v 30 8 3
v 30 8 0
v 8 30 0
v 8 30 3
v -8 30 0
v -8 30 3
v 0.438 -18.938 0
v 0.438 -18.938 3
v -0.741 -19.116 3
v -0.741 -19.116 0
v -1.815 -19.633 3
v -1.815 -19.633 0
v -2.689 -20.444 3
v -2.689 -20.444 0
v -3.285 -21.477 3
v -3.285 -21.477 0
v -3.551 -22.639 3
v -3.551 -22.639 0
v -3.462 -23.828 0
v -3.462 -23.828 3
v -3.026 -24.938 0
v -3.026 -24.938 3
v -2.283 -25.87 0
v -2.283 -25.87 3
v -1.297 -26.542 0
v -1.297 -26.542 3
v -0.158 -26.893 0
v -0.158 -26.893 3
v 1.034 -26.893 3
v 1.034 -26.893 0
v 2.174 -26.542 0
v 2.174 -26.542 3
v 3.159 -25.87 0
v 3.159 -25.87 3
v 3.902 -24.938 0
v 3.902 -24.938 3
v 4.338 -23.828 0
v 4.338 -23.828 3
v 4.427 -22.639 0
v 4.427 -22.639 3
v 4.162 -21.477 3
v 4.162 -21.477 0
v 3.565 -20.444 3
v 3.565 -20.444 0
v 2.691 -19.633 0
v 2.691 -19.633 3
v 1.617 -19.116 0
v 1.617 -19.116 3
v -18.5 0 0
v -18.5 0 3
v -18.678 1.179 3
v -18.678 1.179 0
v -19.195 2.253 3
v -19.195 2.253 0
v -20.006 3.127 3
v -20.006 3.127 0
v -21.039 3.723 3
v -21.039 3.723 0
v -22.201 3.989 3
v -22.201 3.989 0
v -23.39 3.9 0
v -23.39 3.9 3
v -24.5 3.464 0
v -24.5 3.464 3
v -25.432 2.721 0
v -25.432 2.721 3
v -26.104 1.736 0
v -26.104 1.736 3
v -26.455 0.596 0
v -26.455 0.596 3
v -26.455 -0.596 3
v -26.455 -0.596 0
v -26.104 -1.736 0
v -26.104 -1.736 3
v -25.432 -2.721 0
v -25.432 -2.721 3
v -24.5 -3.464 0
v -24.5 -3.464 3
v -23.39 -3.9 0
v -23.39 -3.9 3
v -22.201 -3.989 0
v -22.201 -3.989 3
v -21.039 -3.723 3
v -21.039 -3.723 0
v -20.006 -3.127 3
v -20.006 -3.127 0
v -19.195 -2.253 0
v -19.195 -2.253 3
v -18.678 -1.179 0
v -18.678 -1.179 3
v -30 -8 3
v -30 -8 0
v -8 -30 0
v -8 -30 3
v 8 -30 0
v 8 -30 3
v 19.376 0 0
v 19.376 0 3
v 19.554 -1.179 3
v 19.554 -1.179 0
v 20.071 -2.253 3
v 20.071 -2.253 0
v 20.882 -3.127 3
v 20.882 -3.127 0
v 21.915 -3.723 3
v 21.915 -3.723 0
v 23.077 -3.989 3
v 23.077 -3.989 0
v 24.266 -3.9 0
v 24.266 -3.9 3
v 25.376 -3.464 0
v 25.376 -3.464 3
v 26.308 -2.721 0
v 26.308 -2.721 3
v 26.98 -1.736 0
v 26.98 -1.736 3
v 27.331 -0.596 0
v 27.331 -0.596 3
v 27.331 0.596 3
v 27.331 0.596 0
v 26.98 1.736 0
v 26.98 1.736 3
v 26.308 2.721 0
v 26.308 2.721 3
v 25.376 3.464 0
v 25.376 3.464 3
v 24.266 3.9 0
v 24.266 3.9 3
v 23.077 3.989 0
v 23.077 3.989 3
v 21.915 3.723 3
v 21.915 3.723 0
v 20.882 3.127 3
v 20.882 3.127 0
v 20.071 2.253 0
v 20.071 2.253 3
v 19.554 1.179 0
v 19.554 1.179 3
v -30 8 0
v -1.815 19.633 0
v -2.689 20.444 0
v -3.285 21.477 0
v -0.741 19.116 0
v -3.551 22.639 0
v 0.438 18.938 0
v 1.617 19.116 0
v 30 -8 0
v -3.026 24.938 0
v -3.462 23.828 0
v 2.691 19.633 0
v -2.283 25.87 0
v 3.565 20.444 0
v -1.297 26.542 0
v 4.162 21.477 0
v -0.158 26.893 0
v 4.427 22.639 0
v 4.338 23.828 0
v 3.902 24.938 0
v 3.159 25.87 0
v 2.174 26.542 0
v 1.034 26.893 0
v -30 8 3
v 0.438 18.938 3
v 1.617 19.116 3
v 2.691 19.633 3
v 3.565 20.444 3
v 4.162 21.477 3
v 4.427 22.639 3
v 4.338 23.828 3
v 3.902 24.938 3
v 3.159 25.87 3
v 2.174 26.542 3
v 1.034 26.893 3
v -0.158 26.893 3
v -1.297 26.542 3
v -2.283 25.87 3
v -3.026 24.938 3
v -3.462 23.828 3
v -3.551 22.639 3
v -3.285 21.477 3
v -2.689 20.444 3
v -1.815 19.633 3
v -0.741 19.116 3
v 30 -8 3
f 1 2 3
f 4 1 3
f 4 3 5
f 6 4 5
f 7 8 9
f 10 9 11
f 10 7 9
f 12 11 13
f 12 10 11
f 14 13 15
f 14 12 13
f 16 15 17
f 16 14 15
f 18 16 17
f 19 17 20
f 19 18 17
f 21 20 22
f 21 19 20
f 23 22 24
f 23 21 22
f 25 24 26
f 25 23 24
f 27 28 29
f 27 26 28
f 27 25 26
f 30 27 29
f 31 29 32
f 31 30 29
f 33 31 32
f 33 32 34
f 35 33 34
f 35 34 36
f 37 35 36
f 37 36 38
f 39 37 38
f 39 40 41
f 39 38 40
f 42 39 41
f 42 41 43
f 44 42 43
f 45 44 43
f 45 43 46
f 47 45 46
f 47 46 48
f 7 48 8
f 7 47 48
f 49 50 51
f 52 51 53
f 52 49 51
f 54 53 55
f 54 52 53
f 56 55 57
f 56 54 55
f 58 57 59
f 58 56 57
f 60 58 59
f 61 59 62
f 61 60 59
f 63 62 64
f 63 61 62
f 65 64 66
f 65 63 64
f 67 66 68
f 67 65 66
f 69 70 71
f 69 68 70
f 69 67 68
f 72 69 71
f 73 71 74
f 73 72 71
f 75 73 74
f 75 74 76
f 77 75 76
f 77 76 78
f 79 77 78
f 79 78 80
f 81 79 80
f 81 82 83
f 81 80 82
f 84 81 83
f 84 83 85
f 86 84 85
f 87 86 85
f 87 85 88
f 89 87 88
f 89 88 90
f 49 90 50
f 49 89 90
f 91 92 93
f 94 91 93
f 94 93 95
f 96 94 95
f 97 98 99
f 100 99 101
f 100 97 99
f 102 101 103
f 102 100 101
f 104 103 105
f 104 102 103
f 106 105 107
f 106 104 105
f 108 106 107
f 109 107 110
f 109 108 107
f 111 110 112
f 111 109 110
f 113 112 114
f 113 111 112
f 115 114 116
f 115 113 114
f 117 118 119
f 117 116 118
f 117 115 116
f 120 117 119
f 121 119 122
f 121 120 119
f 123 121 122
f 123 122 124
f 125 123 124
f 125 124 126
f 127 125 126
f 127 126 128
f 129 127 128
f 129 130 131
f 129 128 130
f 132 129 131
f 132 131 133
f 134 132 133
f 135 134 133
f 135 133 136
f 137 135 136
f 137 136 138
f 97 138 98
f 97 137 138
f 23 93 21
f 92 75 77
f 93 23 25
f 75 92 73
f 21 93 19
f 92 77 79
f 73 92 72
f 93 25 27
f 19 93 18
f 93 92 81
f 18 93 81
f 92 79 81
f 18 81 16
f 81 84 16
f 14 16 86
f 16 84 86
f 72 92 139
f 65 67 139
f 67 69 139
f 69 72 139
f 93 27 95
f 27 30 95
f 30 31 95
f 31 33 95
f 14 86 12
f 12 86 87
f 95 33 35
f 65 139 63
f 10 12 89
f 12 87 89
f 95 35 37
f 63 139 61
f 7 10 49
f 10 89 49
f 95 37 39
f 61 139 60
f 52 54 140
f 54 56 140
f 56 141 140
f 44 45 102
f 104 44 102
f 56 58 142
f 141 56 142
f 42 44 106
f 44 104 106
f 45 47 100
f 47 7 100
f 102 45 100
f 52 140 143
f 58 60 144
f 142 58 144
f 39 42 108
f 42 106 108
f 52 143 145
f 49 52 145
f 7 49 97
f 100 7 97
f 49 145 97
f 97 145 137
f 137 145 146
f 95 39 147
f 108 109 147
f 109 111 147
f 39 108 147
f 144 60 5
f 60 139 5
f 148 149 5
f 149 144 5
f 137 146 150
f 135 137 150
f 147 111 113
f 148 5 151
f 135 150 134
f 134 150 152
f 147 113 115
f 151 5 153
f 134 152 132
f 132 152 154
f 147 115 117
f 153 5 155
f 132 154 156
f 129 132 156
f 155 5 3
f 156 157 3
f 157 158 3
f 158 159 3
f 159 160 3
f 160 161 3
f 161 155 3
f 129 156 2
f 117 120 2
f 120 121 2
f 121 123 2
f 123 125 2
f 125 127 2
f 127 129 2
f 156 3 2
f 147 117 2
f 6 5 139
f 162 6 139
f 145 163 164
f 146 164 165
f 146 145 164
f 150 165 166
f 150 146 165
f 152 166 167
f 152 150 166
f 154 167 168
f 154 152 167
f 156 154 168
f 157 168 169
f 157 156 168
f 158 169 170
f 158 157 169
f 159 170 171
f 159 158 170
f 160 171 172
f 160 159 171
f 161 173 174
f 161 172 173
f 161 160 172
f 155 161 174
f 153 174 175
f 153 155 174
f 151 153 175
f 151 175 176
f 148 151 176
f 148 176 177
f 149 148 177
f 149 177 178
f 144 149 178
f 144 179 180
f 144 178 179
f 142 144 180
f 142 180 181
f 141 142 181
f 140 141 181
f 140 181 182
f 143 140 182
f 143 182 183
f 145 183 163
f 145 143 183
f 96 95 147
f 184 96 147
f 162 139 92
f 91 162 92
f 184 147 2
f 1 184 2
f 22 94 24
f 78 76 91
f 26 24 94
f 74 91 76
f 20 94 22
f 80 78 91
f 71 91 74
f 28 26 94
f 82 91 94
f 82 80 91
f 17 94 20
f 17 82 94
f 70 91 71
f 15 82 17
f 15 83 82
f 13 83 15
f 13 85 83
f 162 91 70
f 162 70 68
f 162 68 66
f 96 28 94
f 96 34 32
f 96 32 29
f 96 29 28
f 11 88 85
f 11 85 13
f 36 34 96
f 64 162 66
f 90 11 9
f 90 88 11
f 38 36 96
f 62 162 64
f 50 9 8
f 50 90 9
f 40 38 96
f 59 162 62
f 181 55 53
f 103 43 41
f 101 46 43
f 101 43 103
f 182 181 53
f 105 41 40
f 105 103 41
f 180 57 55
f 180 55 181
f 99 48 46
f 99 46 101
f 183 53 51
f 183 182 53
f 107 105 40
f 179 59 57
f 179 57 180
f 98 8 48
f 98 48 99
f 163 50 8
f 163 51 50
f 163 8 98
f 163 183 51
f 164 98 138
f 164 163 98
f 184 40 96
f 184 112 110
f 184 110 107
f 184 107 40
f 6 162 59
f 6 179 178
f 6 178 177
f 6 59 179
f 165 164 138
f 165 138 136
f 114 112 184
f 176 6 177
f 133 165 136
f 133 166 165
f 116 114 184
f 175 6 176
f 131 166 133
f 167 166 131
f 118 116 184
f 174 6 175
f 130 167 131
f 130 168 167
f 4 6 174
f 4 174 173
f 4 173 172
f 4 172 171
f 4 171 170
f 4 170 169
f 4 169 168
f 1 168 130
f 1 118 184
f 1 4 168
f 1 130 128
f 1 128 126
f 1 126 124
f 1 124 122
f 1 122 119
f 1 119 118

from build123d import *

# Parameters (mm, degrees)
BOSS_EXTRUDE2_DEPTH = 3
SKETCH1_3_R         = 4
CUT_EXTRUDE1_DEPTH  = 4
CIRPATTERN4_COUNT   = 4


with BuildPart() as part:
    # Sketch1 → Boss-Extrude2 (new body)
    with BuildSketch(Plane.XY):
        Polygon((-8, 30), (-30, 8), (-30, -8), (-8, -30), (8, -30), (30, -8), (30, 8), (8, 30), align=None)
    extrude(amount=BOSS_EXTRUDE2_DEPTH)

    # Sketch1<3> → Cut-Extrude1 (cut, through all)
    with BuildSketch(Plane.XY):
        with Locations((-22.5, 0)):
            Circle(SKETCH1_3_R)
    cut_extrude1 = extrude(amount=CUT_EXTRUDE1_DEPTH, mode=Mode.SUBTRACT)

    # CirPattern4: Cut-Extrude1 ×4 about axis
    cirpattern4_axis = Axis((0.438067256, 0, 0), (0, 0, 1))
    for i in range(1, CIRPATTERN4_COUNT):
        add(cut_extrude1.rotate(cirpattern4_axis, i * 360 / CIRPATTERN4_COUNT), mode=Mode.SUBTRACT)


solid = part.part
